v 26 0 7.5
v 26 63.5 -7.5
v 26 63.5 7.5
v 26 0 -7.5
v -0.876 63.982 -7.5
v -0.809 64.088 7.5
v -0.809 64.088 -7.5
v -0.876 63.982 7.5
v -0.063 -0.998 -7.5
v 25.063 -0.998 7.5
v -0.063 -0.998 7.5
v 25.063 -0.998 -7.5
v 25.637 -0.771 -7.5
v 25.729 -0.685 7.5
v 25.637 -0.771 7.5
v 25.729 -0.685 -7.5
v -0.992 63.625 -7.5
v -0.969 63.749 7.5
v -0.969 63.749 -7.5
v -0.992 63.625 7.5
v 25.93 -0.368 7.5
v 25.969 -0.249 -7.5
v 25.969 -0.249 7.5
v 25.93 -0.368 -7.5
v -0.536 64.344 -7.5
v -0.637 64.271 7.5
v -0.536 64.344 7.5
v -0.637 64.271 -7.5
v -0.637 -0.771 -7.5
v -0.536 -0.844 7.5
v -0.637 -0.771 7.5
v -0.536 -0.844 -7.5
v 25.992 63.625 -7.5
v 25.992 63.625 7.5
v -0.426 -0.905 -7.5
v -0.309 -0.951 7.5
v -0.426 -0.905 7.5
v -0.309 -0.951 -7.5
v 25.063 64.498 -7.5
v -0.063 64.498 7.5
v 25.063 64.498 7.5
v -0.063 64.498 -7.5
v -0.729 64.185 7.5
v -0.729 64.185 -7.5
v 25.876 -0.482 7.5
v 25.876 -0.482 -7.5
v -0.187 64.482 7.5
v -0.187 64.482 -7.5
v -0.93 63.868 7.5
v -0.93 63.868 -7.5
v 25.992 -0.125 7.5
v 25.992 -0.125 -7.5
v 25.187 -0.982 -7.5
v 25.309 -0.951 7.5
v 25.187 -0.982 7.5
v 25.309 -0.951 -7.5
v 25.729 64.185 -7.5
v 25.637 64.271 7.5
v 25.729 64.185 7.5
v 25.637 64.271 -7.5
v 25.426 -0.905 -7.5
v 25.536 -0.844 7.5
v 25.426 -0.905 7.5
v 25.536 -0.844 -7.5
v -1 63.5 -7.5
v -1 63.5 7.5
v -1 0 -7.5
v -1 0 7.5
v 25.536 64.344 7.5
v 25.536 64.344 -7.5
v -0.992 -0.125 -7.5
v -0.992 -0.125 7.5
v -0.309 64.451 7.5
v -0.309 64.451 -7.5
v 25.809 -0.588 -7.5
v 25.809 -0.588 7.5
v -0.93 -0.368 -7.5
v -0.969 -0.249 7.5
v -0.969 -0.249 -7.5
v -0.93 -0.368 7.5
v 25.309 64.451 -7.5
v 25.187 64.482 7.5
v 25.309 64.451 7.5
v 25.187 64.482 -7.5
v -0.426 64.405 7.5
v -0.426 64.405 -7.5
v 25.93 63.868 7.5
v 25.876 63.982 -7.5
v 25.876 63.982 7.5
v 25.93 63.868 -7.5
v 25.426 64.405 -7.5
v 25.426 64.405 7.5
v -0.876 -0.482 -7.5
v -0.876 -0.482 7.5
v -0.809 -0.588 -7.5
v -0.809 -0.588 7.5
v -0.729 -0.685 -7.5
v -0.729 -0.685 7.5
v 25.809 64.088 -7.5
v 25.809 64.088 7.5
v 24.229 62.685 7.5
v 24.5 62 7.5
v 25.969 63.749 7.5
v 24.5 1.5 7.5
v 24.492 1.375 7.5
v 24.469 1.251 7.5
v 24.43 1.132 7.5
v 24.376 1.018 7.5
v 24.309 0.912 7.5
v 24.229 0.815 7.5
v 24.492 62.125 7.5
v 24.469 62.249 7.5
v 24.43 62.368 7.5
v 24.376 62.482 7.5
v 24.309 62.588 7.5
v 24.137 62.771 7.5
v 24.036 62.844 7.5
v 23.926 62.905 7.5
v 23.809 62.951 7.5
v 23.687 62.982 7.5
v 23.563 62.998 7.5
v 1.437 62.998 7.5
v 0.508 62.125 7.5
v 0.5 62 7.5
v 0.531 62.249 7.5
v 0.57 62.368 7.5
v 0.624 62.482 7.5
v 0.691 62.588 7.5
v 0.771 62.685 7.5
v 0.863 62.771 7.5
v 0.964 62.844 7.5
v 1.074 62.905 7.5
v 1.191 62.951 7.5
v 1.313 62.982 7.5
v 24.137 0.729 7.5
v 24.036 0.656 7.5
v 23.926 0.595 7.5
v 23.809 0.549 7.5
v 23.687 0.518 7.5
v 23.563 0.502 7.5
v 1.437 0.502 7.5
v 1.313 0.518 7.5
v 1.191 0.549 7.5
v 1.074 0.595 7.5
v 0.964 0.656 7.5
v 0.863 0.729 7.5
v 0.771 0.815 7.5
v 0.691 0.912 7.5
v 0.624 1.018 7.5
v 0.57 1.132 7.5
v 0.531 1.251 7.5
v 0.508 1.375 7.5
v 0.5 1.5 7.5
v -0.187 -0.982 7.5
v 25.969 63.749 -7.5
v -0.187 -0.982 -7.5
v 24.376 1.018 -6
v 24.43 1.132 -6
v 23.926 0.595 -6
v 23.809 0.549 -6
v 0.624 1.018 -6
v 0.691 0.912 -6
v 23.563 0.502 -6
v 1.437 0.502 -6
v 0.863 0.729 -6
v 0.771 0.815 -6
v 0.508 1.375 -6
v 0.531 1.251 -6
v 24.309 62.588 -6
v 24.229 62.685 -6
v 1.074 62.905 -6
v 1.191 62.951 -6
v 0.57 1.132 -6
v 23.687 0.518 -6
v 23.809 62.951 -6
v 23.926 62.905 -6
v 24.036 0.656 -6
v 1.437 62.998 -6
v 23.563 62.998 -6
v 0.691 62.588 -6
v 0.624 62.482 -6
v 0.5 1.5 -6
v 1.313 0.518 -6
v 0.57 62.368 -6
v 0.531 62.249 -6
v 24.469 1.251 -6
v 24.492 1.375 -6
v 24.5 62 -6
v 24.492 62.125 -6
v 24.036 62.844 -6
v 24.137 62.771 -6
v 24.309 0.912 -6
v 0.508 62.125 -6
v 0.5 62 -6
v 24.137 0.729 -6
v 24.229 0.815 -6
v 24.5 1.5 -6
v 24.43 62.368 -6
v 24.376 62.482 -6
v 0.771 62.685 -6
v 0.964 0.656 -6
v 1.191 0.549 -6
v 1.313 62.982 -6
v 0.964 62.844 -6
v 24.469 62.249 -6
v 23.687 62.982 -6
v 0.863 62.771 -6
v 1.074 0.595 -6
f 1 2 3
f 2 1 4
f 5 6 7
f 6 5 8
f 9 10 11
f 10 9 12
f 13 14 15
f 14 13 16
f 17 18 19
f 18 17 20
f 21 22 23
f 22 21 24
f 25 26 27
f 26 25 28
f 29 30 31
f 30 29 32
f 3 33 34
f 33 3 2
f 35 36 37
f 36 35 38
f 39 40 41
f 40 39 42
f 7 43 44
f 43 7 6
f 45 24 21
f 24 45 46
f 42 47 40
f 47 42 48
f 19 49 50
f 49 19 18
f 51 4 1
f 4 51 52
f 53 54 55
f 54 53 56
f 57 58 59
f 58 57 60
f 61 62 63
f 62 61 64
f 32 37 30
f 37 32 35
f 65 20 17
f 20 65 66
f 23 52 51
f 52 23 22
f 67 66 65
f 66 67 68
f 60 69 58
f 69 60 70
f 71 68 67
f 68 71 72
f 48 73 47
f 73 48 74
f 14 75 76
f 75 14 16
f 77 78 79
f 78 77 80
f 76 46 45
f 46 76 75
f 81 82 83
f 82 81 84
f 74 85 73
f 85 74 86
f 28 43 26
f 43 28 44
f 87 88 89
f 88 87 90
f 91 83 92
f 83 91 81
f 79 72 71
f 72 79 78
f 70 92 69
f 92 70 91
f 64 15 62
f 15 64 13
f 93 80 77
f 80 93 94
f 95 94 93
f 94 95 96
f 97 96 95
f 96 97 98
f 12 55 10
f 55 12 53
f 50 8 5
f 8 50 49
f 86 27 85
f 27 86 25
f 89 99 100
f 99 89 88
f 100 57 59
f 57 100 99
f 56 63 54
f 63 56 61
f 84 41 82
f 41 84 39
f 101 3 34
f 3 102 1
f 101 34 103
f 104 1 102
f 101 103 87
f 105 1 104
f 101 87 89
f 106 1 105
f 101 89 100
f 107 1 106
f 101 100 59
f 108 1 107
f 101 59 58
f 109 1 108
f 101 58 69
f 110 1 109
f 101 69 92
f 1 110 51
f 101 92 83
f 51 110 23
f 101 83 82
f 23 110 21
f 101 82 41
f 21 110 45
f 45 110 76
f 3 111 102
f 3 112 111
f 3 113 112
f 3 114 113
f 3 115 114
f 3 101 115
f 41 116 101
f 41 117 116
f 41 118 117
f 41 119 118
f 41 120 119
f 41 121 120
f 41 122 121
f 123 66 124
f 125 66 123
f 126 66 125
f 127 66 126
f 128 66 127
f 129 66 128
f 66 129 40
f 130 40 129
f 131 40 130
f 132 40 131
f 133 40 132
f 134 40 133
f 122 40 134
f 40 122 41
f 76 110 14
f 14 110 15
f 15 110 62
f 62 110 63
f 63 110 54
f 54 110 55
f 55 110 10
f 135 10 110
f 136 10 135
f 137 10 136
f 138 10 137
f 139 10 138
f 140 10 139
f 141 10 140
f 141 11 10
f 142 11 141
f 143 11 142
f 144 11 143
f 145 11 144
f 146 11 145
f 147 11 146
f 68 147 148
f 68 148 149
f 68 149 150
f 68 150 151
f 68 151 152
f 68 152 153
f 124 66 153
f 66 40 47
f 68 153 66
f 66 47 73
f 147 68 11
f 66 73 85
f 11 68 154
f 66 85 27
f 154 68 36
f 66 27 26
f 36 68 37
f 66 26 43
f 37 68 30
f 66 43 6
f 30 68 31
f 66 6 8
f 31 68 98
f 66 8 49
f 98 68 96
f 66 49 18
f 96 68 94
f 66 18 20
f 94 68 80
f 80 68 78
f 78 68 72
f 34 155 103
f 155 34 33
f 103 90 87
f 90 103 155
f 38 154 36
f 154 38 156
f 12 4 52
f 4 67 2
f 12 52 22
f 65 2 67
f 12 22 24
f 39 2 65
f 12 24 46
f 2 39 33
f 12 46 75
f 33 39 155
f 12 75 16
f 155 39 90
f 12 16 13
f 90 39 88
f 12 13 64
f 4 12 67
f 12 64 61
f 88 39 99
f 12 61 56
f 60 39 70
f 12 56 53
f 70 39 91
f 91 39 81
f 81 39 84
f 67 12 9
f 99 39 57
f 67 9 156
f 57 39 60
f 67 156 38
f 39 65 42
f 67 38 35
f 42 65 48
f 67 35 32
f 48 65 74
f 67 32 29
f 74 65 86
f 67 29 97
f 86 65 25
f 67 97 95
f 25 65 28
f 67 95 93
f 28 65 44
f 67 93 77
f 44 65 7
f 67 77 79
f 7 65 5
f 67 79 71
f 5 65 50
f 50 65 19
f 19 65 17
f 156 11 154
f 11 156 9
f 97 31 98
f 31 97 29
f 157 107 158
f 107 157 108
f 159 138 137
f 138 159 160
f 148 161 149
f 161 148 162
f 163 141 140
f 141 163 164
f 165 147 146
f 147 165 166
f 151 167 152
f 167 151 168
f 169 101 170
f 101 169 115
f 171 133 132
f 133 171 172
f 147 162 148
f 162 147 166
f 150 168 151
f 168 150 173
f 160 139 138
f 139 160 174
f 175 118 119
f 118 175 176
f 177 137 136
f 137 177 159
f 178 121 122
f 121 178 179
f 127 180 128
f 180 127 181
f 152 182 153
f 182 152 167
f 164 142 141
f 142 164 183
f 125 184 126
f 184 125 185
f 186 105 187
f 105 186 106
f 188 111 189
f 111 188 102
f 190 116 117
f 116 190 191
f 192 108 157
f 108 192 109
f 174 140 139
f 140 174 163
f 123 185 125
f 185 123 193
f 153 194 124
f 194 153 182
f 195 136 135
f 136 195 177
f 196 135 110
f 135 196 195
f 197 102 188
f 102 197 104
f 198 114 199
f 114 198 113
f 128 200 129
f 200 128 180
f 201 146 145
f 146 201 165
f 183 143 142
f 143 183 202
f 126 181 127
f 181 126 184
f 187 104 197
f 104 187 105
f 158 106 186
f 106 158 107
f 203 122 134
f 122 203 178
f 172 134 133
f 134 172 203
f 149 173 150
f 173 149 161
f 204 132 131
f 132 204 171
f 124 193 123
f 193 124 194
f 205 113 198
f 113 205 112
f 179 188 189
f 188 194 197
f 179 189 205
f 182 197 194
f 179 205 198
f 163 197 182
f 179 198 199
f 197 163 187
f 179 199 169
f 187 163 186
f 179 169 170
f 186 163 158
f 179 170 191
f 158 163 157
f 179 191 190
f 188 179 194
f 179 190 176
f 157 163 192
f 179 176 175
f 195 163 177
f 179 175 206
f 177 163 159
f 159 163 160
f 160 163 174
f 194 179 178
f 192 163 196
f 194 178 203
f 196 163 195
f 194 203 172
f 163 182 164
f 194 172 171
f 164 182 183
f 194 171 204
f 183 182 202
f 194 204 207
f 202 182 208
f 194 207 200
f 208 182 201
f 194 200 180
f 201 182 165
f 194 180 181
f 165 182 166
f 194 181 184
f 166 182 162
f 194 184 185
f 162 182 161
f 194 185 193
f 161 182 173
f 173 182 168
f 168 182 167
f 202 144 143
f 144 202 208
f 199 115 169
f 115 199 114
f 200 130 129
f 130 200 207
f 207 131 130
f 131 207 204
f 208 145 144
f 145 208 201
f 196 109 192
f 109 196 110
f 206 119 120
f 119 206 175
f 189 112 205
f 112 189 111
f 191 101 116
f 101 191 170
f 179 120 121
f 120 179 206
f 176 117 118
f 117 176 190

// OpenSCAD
$fn=50;

x=22;
y=60.5;
z=15;

wall=1.5;


// vicko
/*
union() {

    hull() {
        translate([0, 0, 0])
            cylinder(d=2, h=1, center=true);

        translate([x+ 2*wall, 0, 0])
            cylinder(d=2, h=1, center=true);
            
        translate([0, y+ 2*wall, 0])
            cylinder(d=2, h=1, center=true);

        translate([x+2*wall, y+ 2*wall, 0])
            cylinder(d=2, h=1, center=true);
    }

    translate([wall, wall, wall])
    difference() {
    hull() {
        translate([0, 0, 0])
            cylinder(d=2, h=1, center=true);

        translate([x, 0, 0])
            cylinder(d=2, h=1, center=true);
            
        translate([0, y, 0])
            cylinder(d=2, h=1, center=true);

        translate([x, y, 0])
            cylinder(d=2, h=1, center=true);
    }
    translate([wall, wall, wall-1])
    hull() {
        translate([0, 0, 0])
            cylinder(d=2, h=1, center=true);

        translate([x-2*wall, 0, 0])
            cylinder(d=2, h=1, center=true);
            
        translate([0, y-2*wall, 0])
            cylinder(d=2, h=1, center=true);

        translate([x-2*wall, y-2*wall, 0])
            cylinder(d=2, h=1, center=true);
    }
}
}
*/

// telo

difference() {

    hull() {
        translate([0, 0, 0])
            cylinder(d=2, h=z, center=true);

        translate([x+ 2*wall, 0, 0])
            cylinder(d=2, h=z, center=true);
            
        translate([0, y+ 2*wall, 0])
            cylinder(d=2, h=z, center=true);

        translate([x+2*wall, y+ 2*wall, 0])
            cylinder(d=2, h=z, center=true);
    }

    translate([wall, wall, wall])
    hull() {
        translate([0, 0, 0])
            cylinder(d=2, h=z, center=true);

        translate([x, 0, 0])
            cylinder(d=2, h=z, center=true);
            
        translate([0, y, 0])
            cylinder(d=2, h=z, center=true);

        translate([x, y, 0])
            cylinder(d=2, h=z, center=true);
    }
}
